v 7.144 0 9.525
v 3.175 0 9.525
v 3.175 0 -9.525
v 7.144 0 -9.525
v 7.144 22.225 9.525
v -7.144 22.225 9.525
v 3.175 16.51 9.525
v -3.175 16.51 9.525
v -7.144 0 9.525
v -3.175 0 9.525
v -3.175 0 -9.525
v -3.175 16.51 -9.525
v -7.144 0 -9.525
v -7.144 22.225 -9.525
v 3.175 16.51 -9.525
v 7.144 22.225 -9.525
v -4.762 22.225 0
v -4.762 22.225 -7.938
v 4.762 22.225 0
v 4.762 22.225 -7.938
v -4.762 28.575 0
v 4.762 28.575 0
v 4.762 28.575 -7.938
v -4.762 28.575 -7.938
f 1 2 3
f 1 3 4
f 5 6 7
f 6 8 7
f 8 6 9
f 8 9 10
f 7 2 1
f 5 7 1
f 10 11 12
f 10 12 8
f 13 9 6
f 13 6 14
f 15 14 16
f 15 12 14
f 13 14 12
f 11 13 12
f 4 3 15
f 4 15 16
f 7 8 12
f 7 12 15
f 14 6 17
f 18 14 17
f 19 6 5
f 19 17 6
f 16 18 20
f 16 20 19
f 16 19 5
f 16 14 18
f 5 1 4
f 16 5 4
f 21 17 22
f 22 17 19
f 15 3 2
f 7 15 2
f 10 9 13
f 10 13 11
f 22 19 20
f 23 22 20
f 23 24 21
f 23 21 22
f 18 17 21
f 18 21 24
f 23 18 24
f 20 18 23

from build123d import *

# Parameters (mm, degrees)
SKETCH3_W           = 14.2875
SKETCH3_H           = 19.05
BOSS_EXTRUDE1_DEPTH = 22.225
SKETCH4_W           = 9.525
SKETCH4_H           = 7.9375
BOSS_EXTRUDE2_DEPTH = 6.35
SKETCH5_W           = 6.35
SKETCH5_H           = 19.05
CUT_EXTRUDE1_DEPTH  = 16.51


with BuildPart() as part:
    # Sketch3 → Boss-Extrude1 (new body)
    with BuildSketch(Plane(origin=(0, 0, 0), x_dir=(1, 0, 0), z_dir=(0, 1, 0))):
        Rectangle(SKETCH3_W, SKETCH3_H)
    extrude(amount=BOSS_EXTRUDE1_DEPTH)

    # Sketch4 → Boss-Extrude2 (add)
    with BuildSketch(Plane(origin=(0, 22.225, 0), x_dir=(1, 0, 0), z_dir=(0, 1, 0))):
        with Locations((0, 3.96875)):
            Rectangle(SKETCH4_W, SKETCH4_H)
    extrude(amount=BOSS_EXTRUDE2_DEPTH)

    # Sketch5 → Cut-Extrude1 (cut)
    with BuildSketch(Plane.XZ):
        Rectangle(SKETCH5_W, SKETCH5_H)
    extrude(amount=-CUT_EXTRUDE1_DEPTH, mode=Mode.SUBTRACT)


solid = part.part
